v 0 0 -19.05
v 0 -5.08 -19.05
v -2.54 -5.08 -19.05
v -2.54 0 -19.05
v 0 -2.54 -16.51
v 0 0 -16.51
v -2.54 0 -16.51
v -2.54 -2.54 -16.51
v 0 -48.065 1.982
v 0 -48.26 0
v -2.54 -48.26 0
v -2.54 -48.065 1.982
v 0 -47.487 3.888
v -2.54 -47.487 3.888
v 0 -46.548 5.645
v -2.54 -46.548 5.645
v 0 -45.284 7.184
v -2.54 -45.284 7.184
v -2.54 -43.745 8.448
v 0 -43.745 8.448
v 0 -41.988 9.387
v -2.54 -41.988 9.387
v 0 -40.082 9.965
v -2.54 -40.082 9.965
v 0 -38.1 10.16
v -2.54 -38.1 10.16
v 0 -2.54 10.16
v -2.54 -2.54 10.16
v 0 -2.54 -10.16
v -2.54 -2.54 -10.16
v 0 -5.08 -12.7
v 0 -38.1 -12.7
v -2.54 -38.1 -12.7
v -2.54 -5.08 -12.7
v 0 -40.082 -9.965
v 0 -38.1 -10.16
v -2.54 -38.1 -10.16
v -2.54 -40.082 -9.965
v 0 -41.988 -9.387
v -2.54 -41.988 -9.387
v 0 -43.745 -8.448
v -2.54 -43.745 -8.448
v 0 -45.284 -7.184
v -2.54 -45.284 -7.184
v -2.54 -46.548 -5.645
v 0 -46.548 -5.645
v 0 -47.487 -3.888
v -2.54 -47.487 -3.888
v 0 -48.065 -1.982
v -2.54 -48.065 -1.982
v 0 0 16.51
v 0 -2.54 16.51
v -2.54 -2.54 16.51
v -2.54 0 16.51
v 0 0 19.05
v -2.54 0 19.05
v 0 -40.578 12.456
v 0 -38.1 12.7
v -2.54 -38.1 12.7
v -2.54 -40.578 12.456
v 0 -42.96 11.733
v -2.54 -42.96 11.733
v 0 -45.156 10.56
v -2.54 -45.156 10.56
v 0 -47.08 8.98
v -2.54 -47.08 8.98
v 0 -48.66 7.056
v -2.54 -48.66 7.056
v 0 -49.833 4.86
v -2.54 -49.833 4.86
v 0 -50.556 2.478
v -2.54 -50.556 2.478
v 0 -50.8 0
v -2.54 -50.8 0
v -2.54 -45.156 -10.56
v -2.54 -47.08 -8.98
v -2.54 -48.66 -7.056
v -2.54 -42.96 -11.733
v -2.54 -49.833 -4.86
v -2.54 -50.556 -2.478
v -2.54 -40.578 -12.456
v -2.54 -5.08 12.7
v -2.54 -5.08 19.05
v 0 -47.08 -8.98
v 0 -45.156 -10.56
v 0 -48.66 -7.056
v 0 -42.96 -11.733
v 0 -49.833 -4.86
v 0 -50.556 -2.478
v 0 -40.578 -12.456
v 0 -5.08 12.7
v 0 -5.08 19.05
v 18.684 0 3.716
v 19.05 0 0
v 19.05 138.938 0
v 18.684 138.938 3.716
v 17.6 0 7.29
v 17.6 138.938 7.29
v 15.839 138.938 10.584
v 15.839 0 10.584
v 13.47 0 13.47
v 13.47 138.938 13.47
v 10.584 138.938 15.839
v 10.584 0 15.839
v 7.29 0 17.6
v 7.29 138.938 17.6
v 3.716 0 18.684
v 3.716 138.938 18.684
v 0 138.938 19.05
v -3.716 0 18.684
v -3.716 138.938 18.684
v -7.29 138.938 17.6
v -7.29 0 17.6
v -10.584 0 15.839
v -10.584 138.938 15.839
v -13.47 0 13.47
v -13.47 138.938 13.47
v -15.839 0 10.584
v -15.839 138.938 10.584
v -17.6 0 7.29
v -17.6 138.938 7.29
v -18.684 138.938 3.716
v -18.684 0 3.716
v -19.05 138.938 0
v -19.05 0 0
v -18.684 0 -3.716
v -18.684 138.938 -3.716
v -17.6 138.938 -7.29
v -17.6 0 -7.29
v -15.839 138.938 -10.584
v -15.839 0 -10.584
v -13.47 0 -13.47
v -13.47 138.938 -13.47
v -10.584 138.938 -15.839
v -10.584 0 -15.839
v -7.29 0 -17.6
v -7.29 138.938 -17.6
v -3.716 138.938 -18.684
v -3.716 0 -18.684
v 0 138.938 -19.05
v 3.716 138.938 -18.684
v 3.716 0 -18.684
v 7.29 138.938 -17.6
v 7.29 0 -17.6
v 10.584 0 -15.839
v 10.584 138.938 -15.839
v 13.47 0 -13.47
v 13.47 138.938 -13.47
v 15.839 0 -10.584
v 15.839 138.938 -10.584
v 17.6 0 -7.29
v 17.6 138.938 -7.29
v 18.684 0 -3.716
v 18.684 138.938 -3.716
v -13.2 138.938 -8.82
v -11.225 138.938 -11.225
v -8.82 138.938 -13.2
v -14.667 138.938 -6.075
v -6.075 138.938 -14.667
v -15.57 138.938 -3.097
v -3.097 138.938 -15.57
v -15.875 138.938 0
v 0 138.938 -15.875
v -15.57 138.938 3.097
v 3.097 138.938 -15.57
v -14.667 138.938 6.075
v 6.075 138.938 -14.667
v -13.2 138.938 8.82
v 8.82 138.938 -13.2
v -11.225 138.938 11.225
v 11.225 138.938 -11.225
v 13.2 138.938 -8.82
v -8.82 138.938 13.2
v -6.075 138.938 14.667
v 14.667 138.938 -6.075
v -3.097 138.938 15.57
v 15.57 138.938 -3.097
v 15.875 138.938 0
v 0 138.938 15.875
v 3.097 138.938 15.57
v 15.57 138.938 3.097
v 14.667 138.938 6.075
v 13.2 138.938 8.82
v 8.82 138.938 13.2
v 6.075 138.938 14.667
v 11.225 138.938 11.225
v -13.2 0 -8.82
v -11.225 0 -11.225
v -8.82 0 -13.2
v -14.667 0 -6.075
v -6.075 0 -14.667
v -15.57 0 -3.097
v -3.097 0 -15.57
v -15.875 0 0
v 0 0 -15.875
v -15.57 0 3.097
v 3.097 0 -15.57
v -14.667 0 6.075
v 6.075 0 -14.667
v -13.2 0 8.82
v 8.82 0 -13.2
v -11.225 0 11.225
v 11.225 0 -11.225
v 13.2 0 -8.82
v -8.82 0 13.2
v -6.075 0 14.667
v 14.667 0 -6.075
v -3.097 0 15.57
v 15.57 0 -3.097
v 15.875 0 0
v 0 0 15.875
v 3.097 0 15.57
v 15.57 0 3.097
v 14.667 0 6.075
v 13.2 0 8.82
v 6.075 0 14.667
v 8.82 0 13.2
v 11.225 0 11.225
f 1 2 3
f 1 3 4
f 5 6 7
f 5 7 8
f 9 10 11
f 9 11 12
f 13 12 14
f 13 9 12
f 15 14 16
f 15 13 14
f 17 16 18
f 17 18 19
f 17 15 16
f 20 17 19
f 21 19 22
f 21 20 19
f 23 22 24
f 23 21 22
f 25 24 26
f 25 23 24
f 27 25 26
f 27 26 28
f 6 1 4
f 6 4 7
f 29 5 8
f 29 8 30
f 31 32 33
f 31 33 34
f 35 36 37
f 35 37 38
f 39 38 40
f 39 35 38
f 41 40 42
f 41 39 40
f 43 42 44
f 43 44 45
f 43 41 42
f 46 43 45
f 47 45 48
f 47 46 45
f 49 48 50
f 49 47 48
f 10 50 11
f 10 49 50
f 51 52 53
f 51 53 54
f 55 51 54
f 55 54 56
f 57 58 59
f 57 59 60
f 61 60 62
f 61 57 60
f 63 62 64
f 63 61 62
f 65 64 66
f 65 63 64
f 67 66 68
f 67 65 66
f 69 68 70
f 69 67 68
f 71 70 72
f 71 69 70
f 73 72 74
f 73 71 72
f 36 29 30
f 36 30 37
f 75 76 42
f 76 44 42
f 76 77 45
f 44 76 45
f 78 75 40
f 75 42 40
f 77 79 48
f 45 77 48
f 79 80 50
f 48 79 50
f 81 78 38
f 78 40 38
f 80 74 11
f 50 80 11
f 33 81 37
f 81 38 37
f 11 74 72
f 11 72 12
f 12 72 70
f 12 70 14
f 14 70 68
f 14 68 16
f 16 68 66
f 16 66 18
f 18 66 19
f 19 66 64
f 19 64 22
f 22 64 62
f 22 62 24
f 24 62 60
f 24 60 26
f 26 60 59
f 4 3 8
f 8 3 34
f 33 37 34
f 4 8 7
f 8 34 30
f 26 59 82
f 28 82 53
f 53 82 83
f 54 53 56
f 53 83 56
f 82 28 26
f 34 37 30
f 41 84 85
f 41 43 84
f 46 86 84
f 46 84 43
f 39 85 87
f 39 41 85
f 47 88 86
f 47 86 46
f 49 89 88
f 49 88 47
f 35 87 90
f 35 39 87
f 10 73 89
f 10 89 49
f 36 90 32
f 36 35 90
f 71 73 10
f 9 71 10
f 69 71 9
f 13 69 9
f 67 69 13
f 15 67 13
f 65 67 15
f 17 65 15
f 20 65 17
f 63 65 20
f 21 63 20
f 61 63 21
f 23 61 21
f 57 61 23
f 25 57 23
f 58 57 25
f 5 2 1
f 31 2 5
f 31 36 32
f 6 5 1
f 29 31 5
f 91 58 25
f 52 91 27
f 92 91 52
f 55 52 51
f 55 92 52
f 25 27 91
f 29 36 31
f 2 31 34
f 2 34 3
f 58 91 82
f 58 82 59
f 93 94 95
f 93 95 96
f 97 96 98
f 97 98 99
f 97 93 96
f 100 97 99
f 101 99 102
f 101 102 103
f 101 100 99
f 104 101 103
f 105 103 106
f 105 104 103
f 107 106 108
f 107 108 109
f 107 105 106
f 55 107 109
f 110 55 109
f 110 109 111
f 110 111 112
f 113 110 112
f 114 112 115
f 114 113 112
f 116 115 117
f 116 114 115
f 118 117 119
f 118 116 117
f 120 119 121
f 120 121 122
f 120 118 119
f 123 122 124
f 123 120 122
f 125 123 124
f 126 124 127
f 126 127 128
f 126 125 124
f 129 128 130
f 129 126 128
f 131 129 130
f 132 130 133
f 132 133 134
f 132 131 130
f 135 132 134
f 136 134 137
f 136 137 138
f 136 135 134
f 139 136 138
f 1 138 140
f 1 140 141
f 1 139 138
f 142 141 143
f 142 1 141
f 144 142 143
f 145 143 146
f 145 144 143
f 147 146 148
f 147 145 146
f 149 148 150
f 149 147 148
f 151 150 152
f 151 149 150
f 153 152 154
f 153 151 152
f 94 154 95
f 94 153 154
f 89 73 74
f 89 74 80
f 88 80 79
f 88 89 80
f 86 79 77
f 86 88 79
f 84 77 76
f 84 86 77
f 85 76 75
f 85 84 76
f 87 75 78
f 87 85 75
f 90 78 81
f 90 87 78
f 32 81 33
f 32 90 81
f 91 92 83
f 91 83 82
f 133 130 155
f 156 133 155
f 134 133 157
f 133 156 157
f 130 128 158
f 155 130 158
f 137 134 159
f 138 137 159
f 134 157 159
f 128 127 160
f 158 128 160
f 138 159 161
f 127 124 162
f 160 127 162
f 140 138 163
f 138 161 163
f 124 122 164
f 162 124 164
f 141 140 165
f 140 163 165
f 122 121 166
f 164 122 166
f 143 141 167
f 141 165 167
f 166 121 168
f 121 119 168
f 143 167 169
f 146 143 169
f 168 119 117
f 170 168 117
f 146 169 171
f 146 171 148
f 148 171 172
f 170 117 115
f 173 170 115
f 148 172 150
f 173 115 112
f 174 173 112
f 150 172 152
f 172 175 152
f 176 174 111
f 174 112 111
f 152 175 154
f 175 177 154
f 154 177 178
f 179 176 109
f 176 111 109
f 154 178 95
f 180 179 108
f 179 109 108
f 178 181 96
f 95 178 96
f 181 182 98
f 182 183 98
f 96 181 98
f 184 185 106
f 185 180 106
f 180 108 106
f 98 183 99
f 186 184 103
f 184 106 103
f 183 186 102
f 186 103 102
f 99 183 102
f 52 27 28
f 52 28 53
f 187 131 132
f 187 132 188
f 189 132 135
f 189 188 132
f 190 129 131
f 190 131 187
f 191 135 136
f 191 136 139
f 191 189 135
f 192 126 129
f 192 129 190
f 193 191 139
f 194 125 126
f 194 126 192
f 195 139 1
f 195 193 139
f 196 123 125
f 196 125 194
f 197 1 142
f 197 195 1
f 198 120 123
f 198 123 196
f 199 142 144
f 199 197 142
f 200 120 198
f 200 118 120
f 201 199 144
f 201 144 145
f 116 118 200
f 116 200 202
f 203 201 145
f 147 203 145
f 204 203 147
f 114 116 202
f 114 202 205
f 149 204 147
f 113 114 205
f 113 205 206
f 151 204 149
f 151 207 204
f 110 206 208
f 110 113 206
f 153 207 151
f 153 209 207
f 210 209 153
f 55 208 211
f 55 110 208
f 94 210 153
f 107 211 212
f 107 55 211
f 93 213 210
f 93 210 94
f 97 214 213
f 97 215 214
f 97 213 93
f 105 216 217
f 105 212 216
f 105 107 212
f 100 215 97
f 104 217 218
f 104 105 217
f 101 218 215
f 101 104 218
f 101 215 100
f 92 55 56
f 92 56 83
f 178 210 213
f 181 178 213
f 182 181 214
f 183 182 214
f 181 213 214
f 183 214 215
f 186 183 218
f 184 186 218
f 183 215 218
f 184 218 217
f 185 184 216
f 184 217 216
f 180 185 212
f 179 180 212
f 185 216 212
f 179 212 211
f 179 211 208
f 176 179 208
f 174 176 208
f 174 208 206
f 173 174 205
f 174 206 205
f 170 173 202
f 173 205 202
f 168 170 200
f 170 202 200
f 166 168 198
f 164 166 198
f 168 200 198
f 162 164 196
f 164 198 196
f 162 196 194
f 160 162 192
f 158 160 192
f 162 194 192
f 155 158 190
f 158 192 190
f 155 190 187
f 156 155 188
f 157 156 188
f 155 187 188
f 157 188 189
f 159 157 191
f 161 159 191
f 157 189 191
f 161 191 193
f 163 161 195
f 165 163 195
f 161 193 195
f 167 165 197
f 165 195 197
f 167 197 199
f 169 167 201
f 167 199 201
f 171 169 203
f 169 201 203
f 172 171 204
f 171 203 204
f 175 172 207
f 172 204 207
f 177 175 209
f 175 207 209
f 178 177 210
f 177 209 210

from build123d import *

# Parameters (mm, degrees)
F0_R     = 19.05
F0_R_2   = 15.875
F1_DEPTH = 138.938
F3_DEPTH = 2.54
F4_W     = 2.54
F4_H     = 2.54
F5_DEPTH = 25.4


with BuildPart() as f1:
    # F0 (on Front) → F1 (new body)
    with BuildSketch(Plane.XZ):
        Circle(F0_R)
        Circle(F0_R_2, mode=Mode.SUBTRACT)
    extrude(amount=-F1_DEPTH)


with BuildPart() as f3:
    # F2 (on Right) → F3 (new body)
    with BuildSketch(Plane.YZ):
        with BuildLine():
            Line((0, 10.16), (0, 12.7))
            Line((0, 12.7), (-2.54, 12.7))
            Line((-2.54, 12.7), (-2.54, 16.51))
            Line((-2.54, 16.51), (0, 16.51))
            Line((0, 16.51), (0, 19.05))
            Line((0, 19.05), (-2.54, 19.05))
            Line((-2.54, 19.05), (-5.08, 19.05))
            Line((-5.08, 19.05), (-5.08, 12.7))
            Line((-5.08, 12.7), (-38.1, 12.7))
            ThreePointArc((-38.1, 12.7), (-47.080256, 8.980256), (-50.8, 0))
            ThreePointArc((-50.8, 0), (-47.080256, -8.980256), (-38.1, -12.7))
            Line((-38.1, -12.7), (-5.08, -12.7))
            Line((-5.08, -12.7), (-5.08, -19.05))
            Line((-5.08, -19.05), (-2.54, -19.05))
            Line((-2.54, -19.05), (0, -19.05))
            Line((0, -19.05), (0, -16.51))
            Line((0, -16.51), (-2.54, -16.51))
            Line((-2.54, -16.51), (-2.54, -12.7))
            Line((-2.54, -12.7), (0, -12.7))
            Line((0, -12.7), (0, -10.16))
            Line((0, -10.16), (-38.1, -10.16))
            ThreePointArc((-38.1, -10.16), (-45.284205, -7.184205), (-48.26, 0))
            ThreePointArc((-48.26, 0), (-45.284205, 7.184205), (-38.1, 10.16))
            Line((-38.1, 10.16), (0, 10.16))
        make_face()
    extrude(amount=-F3_DEPTH)

    # F4 (on face) → F5 (cut)
    with BuildSketch(Plane.YZ):
        with Locations((-1.27, 11.43)):
            Rectangle(F4_W, F4_H)
        with Locations((-1.27, -11.43)):
            Rectangle(F4_W, F4_H)
    extrude(amount=-F5_DEPTH, mode=Mode.SUBTRACT)


solid = Compound([f1.part, f3.part])
